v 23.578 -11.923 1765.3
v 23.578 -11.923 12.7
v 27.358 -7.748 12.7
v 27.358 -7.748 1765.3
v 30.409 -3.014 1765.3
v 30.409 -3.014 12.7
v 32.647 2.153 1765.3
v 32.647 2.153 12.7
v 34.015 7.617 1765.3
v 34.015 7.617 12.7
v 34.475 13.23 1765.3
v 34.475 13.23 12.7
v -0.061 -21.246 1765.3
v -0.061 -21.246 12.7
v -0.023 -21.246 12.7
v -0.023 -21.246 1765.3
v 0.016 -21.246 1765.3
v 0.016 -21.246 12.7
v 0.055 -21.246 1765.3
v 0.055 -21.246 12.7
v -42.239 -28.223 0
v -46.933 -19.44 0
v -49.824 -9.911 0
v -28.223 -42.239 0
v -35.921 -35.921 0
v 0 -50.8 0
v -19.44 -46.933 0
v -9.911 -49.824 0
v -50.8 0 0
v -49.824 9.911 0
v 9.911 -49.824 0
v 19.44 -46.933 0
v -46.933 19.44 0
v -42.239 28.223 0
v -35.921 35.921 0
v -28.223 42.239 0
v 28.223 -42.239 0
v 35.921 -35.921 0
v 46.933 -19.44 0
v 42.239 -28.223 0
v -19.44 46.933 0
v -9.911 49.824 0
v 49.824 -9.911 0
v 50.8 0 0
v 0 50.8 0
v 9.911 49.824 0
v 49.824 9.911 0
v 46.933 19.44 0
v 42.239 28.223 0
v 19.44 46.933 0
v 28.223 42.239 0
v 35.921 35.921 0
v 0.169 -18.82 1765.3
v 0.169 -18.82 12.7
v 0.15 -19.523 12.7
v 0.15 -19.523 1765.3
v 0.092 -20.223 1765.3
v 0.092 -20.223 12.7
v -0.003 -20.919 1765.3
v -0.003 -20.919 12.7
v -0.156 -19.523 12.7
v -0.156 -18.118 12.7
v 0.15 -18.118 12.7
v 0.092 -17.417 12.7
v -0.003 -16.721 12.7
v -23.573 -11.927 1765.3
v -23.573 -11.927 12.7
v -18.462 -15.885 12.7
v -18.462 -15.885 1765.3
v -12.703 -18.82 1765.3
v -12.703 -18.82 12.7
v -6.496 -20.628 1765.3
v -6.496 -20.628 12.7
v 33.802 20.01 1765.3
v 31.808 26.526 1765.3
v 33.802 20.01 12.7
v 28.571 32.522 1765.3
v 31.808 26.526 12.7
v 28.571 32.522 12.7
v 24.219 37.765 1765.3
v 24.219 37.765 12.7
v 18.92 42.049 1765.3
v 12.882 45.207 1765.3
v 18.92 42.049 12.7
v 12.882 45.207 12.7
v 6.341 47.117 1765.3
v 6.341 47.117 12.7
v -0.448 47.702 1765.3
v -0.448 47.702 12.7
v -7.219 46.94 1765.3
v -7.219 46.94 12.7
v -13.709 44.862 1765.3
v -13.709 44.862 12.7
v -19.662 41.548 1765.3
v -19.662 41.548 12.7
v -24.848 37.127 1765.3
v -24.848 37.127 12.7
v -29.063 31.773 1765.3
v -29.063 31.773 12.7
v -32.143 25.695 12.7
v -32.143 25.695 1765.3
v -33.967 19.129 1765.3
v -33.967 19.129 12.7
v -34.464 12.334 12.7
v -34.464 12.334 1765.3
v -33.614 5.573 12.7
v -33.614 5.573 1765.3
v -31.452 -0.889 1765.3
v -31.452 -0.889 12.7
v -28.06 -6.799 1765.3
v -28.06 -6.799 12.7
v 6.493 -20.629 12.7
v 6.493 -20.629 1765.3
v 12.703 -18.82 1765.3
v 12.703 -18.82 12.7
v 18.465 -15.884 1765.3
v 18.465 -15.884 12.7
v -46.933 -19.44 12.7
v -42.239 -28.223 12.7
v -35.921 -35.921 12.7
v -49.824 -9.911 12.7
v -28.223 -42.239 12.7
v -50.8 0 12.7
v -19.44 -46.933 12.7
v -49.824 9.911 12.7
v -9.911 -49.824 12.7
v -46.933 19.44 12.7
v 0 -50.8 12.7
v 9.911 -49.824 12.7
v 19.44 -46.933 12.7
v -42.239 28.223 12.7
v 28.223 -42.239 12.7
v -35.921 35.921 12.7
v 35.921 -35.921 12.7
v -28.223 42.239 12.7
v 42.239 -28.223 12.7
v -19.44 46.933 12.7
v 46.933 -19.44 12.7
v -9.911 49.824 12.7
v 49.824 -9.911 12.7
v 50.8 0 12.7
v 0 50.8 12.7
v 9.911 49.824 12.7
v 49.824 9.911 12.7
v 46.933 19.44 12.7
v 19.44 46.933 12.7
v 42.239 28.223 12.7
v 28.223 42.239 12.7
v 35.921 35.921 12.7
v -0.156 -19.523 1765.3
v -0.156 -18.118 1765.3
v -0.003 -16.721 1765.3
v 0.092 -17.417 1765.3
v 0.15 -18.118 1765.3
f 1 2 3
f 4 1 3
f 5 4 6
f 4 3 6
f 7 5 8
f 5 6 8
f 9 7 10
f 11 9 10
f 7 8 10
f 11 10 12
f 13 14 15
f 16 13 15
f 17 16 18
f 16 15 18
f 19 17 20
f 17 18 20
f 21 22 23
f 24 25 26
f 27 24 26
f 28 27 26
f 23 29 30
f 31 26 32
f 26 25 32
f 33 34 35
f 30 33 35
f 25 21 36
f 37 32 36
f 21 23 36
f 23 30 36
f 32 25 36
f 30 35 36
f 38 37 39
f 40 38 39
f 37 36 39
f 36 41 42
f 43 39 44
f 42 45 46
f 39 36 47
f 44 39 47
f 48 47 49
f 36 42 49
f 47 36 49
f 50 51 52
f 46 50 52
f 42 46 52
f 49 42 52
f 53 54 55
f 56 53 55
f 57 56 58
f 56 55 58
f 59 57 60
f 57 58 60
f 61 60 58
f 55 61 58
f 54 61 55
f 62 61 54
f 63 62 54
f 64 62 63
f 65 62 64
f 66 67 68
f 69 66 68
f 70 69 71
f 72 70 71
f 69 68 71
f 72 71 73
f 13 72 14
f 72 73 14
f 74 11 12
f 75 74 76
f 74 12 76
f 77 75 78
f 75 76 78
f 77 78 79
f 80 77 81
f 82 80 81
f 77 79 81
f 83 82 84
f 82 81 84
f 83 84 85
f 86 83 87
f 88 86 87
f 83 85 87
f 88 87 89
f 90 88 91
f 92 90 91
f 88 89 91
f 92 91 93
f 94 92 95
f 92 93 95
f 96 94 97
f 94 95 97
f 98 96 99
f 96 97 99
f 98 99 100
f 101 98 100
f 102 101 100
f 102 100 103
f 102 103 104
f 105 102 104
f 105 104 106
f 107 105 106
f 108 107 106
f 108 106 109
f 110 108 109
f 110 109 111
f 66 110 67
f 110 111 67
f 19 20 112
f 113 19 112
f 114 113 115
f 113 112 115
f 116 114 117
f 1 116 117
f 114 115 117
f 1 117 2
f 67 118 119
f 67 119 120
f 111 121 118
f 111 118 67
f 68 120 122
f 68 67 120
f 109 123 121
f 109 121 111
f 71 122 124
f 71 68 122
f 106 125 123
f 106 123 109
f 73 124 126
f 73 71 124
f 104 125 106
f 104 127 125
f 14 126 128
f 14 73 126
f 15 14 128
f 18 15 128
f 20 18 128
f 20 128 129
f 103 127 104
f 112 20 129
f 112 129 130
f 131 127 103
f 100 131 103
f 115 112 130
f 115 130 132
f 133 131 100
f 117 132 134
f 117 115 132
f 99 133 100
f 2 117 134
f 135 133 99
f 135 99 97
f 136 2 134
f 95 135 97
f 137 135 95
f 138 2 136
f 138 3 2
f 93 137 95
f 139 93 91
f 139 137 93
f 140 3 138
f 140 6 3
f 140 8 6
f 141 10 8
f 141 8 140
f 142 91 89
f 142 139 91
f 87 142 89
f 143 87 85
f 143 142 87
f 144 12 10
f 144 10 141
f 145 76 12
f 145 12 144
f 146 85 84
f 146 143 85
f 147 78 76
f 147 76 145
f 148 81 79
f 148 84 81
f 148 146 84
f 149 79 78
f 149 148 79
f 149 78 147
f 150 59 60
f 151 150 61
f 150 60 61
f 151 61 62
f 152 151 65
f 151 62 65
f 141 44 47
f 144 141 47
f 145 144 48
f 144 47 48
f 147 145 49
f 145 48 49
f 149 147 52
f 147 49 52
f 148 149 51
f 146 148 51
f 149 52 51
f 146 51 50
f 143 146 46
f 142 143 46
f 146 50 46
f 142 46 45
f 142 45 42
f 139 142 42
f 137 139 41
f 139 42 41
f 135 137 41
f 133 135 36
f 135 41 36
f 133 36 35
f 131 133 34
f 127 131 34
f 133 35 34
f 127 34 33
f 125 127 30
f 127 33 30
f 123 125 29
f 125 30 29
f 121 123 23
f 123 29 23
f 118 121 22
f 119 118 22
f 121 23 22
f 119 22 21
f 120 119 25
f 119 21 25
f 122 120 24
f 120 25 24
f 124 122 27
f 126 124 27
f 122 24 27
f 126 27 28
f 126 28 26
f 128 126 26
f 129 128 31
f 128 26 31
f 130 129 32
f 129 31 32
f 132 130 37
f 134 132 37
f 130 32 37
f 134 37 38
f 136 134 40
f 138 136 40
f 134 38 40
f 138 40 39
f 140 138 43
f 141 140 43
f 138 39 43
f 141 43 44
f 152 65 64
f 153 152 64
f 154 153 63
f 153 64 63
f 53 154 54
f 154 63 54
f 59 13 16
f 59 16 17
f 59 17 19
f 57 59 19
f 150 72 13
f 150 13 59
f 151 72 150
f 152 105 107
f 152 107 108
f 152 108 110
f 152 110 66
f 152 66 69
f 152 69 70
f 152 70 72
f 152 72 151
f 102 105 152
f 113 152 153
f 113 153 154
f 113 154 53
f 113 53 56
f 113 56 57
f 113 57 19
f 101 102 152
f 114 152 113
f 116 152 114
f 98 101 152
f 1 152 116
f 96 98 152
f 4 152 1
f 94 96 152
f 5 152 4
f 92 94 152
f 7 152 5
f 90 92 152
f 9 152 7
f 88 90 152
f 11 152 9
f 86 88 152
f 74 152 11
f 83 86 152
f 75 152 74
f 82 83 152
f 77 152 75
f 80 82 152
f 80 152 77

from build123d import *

# Parameters (mm, degrees)
F0_R     = 50.8
F1_DEPTH = 12.7
F3_DEPTH = 1752.6


with BuildPart() as f1:
    # F0 (on Top) → F1 (new body)
    with BuildSketch(Plane.XY):
        Circle(F0_R)
    extrude(amount=F1_DEPTH)

    # F2 (on face) → F3 (join)
    with BuildSketch(Plane.XY.offset(12.7)):
        with BuildLine():
            ThreePointArc((-0.0031752568, -20.9190722188), (-0.0312761161, -21.0825451789), (-0.06148119, -21.245642452))
            ThreePointArc((-0.06148119, -21.245642452), (-0.0031888656, -21.2456971257), (0.055103468, -21.2456532358))
            ThreePointArc((0.055103468, -21.2456532358), (0.024912457, -21.0825503951), (-0.0031752568, -20.9190722188))
        make_face()
        with BuildLine():
            ThreePointArc((23.5776117563, -11.9227459757), (31.6337017768, -0.4762724508), (34.4751987068, 13.2295014337))
            ThreePointArc((34.4751987068, 13.2295014337), (-13.7086998604, 44.861935327), (-23.5729583189, -11.92710728))
            ThreePointArc((-23.5729583189, -11.92710728), (-10.1369376903, -6.2068210975), (-0.0031752568, -16.7213435918))
            ThreePointArc((-0.0031752568, -16.7213435918), (10.1345978143, -6.2009032292), (23.5776117563, -11.9227459757))
        make_face()
        with BuildLine():
            ThreePointArc((-0.0031752568, -16.7213435918), (-10.1369376903, -6.2068210975), (-23.5729583189, -11.92710728))
            ThreePointArc((-23.5729583189, -11.92710728), (-12.7025767923, -18.8202079053), (-0.06148119, -21.245642452))
            ThreePointArc((-0.06148119, -21.245642452), (-0.0312761161, -21.0825451789), (-0.0031752568, -20.9190722188))
            ThreePointArc((-0.0031752568, -20.9190722188), (-0.1753642908, -18.8202079053), (-0.0031752568, -16.7213435918))
        make_face()
        with BuildLine():
            ThreePointArc((0.055103468, -21.2456532358), (12.7025767923, -18.8202079053), (23.5776117563, -11.9227459757))
            ThreePointArc((23.5776117563, -11.9227459757), (10.1345978143, -6.2009032292), (-0.0031752568, -16.7213435918))
            ThreePointArc((-0.0031752568, -16.7213435918), (0.1259579382, -17.7672466366), (0.1690987306, -18.8202079053))
            ThreePointArc((0.1690987306, -18.8202079053), (0.1259579382, -19.873169174), (-0.0031752568, -20.9190722188))
            ThreePointArc((-0.0031752568, -20.9190722188), (0.024912457, -21.0825503951), (0.055103468, -21.2456532358))
        make_face()
    extrude(amount=F3_DEPTH)


solid = f1.part
